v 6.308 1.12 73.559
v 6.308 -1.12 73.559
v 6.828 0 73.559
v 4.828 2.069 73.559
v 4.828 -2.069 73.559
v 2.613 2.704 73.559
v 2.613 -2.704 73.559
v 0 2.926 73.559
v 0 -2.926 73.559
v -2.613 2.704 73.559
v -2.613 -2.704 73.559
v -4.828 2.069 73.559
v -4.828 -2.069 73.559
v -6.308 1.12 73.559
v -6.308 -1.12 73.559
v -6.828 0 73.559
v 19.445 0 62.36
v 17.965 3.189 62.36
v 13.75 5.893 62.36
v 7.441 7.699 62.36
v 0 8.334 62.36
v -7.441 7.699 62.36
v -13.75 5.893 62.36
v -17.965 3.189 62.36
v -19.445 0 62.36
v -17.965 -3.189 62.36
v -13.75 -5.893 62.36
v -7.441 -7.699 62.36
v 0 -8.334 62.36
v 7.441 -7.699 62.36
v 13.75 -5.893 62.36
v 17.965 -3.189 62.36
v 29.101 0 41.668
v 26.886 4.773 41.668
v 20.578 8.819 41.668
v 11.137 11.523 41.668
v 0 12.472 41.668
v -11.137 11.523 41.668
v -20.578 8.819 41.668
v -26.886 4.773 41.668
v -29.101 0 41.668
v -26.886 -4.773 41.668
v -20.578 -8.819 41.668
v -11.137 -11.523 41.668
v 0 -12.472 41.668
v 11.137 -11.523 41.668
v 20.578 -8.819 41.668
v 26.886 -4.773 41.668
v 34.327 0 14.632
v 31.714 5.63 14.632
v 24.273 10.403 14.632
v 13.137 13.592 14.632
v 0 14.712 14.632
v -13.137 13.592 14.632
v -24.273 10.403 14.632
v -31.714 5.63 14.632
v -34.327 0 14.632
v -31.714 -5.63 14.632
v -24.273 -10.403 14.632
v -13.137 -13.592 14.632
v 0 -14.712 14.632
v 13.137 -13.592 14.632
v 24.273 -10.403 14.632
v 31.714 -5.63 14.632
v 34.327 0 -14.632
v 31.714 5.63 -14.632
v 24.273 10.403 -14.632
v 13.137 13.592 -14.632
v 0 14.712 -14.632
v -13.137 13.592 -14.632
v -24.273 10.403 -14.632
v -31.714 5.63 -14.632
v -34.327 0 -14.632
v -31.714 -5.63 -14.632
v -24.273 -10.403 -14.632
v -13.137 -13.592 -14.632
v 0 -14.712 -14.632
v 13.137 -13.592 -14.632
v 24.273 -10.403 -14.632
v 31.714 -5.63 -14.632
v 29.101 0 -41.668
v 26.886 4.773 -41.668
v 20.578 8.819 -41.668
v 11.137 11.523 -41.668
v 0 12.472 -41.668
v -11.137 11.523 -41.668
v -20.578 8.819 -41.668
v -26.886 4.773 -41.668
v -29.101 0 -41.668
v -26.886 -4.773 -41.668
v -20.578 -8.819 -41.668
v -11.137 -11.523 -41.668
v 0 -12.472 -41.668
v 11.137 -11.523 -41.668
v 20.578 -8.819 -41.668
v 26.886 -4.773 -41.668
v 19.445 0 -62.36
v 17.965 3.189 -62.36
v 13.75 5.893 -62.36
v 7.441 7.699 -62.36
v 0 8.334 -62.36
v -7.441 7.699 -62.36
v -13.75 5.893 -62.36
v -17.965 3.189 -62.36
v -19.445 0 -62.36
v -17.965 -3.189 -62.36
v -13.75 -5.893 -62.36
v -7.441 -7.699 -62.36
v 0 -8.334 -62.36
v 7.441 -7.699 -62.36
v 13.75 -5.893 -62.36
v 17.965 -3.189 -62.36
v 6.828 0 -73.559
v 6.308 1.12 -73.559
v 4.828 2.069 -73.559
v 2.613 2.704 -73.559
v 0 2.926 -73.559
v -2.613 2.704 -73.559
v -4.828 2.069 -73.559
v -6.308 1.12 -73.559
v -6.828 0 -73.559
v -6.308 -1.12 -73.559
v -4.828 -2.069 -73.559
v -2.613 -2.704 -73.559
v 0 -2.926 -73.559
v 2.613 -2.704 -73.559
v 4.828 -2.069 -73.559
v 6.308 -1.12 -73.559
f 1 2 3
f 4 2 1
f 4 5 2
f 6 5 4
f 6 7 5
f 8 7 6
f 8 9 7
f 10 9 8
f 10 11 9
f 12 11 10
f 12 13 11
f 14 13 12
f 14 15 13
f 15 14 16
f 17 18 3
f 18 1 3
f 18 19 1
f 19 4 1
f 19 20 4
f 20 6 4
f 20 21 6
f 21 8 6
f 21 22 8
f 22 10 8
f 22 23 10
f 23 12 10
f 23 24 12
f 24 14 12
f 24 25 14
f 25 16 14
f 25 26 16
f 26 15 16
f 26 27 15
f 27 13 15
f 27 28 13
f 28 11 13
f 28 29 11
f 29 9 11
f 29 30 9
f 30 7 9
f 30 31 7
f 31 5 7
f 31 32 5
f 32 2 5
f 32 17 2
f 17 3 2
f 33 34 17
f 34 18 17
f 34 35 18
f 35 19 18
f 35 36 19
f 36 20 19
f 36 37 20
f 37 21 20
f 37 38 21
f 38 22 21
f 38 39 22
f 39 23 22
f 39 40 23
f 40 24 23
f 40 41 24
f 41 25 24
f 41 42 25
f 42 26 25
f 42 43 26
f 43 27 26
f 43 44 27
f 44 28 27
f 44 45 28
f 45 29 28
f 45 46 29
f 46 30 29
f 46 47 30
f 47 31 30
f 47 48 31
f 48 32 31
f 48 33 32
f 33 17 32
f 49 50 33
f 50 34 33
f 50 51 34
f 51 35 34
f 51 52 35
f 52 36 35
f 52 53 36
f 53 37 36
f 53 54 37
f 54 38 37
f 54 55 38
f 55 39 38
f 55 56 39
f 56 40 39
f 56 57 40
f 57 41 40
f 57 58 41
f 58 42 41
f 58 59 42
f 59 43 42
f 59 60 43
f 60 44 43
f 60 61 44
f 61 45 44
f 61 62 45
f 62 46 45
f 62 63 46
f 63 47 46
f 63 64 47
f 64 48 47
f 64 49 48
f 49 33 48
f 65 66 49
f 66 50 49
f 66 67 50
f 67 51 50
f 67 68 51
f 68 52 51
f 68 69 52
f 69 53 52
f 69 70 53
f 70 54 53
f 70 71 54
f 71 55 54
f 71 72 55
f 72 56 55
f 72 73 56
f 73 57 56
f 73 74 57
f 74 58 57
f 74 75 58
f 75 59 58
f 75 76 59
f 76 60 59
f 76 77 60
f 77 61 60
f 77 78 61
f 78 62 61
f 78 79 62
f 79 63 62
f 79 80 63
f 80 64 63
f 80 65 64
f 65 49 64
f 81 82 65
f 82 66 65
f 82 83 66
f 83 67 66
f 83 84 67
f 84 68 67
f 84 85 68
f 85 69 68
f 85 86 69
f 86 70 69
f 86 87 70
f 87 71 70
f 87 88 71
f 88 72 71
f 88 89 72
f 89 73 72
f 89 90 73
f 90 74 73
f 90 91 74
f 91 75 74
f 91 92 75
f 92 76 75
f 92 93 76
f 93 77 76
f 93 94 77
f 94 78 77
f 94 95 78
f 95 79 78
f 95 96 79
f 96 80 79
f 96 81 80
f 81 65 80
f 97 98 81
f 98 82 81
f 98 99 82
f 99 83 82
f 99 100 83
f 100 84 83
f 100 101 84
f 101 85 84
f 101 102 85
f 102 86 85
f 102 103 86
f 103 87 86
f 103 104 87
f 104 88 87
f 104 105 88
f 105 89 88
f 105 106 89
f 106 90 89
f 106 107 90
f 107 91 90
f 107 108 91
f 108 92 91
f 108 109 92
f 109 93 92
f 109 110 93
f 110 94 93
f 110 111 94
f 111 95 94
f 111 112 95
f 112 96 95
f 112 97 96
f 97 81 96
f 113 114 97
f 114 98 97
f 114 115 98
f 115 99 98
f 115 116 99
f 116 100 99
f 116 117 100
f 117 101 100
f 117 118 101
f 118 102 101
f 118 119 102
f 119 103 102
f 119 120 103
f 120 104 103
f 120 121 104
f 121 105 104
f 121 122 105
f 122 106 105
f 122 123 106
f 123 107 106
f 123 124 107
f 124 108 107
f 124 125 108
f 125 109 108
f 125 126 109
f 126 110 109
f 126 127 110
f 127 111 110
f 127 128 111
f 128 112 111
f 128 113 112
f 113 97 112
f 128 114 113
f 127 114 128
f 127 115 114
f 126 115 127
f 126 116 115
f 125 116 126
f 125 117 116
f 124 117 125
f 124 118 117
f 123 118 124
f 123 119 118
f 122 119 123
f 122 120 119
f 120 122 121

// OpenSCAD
// Generated by SolidPython 1.0.1 on 2020-07-29 00:46:47


scale(v = [7, 3, 15]) {
	sphere(r = 5);
}
/***********************************************
*********      SolidPython code:      **********
************************************************
 
# import packages: SolidPython
from solid import *
from solid.utils import *
from itertools import chain, combinations, permutations


class Resize:

    def __init__(self, scad_file):
        self.scad_file = scad_file
        #self.scad_file = import_scad(scad_file)
        # cone/cylinder param:
        self.r1 = 0
        self.r2 = 0
        self.h = 0
        # rectangular prism param:
        self.w = 0
        self.l = 0
        # ellipse param:
        self.r = 0

    # import OpenScad code (file name corresponds to shape)


    # classify shape + parameters
    def assign(self, param1, param2, param3):
        if self.scad_file == 'cone.scad':
            self.r1 = param1
            self.r2 = param2
            self.h = param3
        elif self.scad_file == 'cylinder.scad':
            self.r1 = param1
            self.r2 = param2
            self.h = param3
        elif self.scad_file == 'rectangularPrism.scad':
            self.h = param1
            self.l = param2
            self.w = param3
        else:
            self.r = param1
            self.h = param2

    # resize parameters
    def iterate(self):
        x = range(3, 20, 2)
        i = 1
        if self.scad_file == 'cone.scad':
            tempList = list(permutations(x, 2))
            for temp in tempList:
                param1 = temp[0]
                param2 = temp[1]
                filepath = 'produced_scad_files/' + 'cone' + str(param1) + '_' + str(param2) + '_' + '.scad'
                scad_render_to_file(cylinder(h=param1, r1=param2, r2=0), filepath)

        elif self.scad_file == 'cylinder.scad':
            tempList = list(permutations(x, 3))
            for temp in tempList:
                param1 = temp[0]
                param2 = temp[1]
                filepath = 'produced_scad_files/' + 'cylinder' + str(param1) + '_' + str(param2) + '_' + '.scad'
                scad_render_to_file(cylinder(h=param1, r1=param2, r2=param2), filepath)

        elif self.scad_file == 'rectangularPrism.scad':
            tempList = list(permutations(x, 3))
            for temp in tempList:
                param1 = temp[0]
                param2 = temp[1]
                param3 = temp[2]
                filepath = 'produced_scad_files/' + 'rectangularPrism' + str(param1) + '_' + str(param2) + '_' + str(
                    param3) + '.scad'
                scad_render_to_file(cube(size=(param1, param2, param3)), filepath)

        elif self.scad_file == 'ellipse.scad':
            tempList = list(permutations(x, 4))
            for temp in tempList:
                param1 = temp[0]
                param2 = temp[1]
                param3 = temp[2]
                param4 = temp[3]
                filepath = 'produced_scad_files/' + 'ellipse' + str(param1) + '_' + str(param2) + '_' + str(param3) + '_' + str(param4) + '.scad'
                scad_render_to_file(scale([param1, param2, param3])(sphere(r=param4)), filepath)

    def render_to_scadfile(self):
        scad_render_to_file(scad, 'example.scad') 
 
************************************************/
